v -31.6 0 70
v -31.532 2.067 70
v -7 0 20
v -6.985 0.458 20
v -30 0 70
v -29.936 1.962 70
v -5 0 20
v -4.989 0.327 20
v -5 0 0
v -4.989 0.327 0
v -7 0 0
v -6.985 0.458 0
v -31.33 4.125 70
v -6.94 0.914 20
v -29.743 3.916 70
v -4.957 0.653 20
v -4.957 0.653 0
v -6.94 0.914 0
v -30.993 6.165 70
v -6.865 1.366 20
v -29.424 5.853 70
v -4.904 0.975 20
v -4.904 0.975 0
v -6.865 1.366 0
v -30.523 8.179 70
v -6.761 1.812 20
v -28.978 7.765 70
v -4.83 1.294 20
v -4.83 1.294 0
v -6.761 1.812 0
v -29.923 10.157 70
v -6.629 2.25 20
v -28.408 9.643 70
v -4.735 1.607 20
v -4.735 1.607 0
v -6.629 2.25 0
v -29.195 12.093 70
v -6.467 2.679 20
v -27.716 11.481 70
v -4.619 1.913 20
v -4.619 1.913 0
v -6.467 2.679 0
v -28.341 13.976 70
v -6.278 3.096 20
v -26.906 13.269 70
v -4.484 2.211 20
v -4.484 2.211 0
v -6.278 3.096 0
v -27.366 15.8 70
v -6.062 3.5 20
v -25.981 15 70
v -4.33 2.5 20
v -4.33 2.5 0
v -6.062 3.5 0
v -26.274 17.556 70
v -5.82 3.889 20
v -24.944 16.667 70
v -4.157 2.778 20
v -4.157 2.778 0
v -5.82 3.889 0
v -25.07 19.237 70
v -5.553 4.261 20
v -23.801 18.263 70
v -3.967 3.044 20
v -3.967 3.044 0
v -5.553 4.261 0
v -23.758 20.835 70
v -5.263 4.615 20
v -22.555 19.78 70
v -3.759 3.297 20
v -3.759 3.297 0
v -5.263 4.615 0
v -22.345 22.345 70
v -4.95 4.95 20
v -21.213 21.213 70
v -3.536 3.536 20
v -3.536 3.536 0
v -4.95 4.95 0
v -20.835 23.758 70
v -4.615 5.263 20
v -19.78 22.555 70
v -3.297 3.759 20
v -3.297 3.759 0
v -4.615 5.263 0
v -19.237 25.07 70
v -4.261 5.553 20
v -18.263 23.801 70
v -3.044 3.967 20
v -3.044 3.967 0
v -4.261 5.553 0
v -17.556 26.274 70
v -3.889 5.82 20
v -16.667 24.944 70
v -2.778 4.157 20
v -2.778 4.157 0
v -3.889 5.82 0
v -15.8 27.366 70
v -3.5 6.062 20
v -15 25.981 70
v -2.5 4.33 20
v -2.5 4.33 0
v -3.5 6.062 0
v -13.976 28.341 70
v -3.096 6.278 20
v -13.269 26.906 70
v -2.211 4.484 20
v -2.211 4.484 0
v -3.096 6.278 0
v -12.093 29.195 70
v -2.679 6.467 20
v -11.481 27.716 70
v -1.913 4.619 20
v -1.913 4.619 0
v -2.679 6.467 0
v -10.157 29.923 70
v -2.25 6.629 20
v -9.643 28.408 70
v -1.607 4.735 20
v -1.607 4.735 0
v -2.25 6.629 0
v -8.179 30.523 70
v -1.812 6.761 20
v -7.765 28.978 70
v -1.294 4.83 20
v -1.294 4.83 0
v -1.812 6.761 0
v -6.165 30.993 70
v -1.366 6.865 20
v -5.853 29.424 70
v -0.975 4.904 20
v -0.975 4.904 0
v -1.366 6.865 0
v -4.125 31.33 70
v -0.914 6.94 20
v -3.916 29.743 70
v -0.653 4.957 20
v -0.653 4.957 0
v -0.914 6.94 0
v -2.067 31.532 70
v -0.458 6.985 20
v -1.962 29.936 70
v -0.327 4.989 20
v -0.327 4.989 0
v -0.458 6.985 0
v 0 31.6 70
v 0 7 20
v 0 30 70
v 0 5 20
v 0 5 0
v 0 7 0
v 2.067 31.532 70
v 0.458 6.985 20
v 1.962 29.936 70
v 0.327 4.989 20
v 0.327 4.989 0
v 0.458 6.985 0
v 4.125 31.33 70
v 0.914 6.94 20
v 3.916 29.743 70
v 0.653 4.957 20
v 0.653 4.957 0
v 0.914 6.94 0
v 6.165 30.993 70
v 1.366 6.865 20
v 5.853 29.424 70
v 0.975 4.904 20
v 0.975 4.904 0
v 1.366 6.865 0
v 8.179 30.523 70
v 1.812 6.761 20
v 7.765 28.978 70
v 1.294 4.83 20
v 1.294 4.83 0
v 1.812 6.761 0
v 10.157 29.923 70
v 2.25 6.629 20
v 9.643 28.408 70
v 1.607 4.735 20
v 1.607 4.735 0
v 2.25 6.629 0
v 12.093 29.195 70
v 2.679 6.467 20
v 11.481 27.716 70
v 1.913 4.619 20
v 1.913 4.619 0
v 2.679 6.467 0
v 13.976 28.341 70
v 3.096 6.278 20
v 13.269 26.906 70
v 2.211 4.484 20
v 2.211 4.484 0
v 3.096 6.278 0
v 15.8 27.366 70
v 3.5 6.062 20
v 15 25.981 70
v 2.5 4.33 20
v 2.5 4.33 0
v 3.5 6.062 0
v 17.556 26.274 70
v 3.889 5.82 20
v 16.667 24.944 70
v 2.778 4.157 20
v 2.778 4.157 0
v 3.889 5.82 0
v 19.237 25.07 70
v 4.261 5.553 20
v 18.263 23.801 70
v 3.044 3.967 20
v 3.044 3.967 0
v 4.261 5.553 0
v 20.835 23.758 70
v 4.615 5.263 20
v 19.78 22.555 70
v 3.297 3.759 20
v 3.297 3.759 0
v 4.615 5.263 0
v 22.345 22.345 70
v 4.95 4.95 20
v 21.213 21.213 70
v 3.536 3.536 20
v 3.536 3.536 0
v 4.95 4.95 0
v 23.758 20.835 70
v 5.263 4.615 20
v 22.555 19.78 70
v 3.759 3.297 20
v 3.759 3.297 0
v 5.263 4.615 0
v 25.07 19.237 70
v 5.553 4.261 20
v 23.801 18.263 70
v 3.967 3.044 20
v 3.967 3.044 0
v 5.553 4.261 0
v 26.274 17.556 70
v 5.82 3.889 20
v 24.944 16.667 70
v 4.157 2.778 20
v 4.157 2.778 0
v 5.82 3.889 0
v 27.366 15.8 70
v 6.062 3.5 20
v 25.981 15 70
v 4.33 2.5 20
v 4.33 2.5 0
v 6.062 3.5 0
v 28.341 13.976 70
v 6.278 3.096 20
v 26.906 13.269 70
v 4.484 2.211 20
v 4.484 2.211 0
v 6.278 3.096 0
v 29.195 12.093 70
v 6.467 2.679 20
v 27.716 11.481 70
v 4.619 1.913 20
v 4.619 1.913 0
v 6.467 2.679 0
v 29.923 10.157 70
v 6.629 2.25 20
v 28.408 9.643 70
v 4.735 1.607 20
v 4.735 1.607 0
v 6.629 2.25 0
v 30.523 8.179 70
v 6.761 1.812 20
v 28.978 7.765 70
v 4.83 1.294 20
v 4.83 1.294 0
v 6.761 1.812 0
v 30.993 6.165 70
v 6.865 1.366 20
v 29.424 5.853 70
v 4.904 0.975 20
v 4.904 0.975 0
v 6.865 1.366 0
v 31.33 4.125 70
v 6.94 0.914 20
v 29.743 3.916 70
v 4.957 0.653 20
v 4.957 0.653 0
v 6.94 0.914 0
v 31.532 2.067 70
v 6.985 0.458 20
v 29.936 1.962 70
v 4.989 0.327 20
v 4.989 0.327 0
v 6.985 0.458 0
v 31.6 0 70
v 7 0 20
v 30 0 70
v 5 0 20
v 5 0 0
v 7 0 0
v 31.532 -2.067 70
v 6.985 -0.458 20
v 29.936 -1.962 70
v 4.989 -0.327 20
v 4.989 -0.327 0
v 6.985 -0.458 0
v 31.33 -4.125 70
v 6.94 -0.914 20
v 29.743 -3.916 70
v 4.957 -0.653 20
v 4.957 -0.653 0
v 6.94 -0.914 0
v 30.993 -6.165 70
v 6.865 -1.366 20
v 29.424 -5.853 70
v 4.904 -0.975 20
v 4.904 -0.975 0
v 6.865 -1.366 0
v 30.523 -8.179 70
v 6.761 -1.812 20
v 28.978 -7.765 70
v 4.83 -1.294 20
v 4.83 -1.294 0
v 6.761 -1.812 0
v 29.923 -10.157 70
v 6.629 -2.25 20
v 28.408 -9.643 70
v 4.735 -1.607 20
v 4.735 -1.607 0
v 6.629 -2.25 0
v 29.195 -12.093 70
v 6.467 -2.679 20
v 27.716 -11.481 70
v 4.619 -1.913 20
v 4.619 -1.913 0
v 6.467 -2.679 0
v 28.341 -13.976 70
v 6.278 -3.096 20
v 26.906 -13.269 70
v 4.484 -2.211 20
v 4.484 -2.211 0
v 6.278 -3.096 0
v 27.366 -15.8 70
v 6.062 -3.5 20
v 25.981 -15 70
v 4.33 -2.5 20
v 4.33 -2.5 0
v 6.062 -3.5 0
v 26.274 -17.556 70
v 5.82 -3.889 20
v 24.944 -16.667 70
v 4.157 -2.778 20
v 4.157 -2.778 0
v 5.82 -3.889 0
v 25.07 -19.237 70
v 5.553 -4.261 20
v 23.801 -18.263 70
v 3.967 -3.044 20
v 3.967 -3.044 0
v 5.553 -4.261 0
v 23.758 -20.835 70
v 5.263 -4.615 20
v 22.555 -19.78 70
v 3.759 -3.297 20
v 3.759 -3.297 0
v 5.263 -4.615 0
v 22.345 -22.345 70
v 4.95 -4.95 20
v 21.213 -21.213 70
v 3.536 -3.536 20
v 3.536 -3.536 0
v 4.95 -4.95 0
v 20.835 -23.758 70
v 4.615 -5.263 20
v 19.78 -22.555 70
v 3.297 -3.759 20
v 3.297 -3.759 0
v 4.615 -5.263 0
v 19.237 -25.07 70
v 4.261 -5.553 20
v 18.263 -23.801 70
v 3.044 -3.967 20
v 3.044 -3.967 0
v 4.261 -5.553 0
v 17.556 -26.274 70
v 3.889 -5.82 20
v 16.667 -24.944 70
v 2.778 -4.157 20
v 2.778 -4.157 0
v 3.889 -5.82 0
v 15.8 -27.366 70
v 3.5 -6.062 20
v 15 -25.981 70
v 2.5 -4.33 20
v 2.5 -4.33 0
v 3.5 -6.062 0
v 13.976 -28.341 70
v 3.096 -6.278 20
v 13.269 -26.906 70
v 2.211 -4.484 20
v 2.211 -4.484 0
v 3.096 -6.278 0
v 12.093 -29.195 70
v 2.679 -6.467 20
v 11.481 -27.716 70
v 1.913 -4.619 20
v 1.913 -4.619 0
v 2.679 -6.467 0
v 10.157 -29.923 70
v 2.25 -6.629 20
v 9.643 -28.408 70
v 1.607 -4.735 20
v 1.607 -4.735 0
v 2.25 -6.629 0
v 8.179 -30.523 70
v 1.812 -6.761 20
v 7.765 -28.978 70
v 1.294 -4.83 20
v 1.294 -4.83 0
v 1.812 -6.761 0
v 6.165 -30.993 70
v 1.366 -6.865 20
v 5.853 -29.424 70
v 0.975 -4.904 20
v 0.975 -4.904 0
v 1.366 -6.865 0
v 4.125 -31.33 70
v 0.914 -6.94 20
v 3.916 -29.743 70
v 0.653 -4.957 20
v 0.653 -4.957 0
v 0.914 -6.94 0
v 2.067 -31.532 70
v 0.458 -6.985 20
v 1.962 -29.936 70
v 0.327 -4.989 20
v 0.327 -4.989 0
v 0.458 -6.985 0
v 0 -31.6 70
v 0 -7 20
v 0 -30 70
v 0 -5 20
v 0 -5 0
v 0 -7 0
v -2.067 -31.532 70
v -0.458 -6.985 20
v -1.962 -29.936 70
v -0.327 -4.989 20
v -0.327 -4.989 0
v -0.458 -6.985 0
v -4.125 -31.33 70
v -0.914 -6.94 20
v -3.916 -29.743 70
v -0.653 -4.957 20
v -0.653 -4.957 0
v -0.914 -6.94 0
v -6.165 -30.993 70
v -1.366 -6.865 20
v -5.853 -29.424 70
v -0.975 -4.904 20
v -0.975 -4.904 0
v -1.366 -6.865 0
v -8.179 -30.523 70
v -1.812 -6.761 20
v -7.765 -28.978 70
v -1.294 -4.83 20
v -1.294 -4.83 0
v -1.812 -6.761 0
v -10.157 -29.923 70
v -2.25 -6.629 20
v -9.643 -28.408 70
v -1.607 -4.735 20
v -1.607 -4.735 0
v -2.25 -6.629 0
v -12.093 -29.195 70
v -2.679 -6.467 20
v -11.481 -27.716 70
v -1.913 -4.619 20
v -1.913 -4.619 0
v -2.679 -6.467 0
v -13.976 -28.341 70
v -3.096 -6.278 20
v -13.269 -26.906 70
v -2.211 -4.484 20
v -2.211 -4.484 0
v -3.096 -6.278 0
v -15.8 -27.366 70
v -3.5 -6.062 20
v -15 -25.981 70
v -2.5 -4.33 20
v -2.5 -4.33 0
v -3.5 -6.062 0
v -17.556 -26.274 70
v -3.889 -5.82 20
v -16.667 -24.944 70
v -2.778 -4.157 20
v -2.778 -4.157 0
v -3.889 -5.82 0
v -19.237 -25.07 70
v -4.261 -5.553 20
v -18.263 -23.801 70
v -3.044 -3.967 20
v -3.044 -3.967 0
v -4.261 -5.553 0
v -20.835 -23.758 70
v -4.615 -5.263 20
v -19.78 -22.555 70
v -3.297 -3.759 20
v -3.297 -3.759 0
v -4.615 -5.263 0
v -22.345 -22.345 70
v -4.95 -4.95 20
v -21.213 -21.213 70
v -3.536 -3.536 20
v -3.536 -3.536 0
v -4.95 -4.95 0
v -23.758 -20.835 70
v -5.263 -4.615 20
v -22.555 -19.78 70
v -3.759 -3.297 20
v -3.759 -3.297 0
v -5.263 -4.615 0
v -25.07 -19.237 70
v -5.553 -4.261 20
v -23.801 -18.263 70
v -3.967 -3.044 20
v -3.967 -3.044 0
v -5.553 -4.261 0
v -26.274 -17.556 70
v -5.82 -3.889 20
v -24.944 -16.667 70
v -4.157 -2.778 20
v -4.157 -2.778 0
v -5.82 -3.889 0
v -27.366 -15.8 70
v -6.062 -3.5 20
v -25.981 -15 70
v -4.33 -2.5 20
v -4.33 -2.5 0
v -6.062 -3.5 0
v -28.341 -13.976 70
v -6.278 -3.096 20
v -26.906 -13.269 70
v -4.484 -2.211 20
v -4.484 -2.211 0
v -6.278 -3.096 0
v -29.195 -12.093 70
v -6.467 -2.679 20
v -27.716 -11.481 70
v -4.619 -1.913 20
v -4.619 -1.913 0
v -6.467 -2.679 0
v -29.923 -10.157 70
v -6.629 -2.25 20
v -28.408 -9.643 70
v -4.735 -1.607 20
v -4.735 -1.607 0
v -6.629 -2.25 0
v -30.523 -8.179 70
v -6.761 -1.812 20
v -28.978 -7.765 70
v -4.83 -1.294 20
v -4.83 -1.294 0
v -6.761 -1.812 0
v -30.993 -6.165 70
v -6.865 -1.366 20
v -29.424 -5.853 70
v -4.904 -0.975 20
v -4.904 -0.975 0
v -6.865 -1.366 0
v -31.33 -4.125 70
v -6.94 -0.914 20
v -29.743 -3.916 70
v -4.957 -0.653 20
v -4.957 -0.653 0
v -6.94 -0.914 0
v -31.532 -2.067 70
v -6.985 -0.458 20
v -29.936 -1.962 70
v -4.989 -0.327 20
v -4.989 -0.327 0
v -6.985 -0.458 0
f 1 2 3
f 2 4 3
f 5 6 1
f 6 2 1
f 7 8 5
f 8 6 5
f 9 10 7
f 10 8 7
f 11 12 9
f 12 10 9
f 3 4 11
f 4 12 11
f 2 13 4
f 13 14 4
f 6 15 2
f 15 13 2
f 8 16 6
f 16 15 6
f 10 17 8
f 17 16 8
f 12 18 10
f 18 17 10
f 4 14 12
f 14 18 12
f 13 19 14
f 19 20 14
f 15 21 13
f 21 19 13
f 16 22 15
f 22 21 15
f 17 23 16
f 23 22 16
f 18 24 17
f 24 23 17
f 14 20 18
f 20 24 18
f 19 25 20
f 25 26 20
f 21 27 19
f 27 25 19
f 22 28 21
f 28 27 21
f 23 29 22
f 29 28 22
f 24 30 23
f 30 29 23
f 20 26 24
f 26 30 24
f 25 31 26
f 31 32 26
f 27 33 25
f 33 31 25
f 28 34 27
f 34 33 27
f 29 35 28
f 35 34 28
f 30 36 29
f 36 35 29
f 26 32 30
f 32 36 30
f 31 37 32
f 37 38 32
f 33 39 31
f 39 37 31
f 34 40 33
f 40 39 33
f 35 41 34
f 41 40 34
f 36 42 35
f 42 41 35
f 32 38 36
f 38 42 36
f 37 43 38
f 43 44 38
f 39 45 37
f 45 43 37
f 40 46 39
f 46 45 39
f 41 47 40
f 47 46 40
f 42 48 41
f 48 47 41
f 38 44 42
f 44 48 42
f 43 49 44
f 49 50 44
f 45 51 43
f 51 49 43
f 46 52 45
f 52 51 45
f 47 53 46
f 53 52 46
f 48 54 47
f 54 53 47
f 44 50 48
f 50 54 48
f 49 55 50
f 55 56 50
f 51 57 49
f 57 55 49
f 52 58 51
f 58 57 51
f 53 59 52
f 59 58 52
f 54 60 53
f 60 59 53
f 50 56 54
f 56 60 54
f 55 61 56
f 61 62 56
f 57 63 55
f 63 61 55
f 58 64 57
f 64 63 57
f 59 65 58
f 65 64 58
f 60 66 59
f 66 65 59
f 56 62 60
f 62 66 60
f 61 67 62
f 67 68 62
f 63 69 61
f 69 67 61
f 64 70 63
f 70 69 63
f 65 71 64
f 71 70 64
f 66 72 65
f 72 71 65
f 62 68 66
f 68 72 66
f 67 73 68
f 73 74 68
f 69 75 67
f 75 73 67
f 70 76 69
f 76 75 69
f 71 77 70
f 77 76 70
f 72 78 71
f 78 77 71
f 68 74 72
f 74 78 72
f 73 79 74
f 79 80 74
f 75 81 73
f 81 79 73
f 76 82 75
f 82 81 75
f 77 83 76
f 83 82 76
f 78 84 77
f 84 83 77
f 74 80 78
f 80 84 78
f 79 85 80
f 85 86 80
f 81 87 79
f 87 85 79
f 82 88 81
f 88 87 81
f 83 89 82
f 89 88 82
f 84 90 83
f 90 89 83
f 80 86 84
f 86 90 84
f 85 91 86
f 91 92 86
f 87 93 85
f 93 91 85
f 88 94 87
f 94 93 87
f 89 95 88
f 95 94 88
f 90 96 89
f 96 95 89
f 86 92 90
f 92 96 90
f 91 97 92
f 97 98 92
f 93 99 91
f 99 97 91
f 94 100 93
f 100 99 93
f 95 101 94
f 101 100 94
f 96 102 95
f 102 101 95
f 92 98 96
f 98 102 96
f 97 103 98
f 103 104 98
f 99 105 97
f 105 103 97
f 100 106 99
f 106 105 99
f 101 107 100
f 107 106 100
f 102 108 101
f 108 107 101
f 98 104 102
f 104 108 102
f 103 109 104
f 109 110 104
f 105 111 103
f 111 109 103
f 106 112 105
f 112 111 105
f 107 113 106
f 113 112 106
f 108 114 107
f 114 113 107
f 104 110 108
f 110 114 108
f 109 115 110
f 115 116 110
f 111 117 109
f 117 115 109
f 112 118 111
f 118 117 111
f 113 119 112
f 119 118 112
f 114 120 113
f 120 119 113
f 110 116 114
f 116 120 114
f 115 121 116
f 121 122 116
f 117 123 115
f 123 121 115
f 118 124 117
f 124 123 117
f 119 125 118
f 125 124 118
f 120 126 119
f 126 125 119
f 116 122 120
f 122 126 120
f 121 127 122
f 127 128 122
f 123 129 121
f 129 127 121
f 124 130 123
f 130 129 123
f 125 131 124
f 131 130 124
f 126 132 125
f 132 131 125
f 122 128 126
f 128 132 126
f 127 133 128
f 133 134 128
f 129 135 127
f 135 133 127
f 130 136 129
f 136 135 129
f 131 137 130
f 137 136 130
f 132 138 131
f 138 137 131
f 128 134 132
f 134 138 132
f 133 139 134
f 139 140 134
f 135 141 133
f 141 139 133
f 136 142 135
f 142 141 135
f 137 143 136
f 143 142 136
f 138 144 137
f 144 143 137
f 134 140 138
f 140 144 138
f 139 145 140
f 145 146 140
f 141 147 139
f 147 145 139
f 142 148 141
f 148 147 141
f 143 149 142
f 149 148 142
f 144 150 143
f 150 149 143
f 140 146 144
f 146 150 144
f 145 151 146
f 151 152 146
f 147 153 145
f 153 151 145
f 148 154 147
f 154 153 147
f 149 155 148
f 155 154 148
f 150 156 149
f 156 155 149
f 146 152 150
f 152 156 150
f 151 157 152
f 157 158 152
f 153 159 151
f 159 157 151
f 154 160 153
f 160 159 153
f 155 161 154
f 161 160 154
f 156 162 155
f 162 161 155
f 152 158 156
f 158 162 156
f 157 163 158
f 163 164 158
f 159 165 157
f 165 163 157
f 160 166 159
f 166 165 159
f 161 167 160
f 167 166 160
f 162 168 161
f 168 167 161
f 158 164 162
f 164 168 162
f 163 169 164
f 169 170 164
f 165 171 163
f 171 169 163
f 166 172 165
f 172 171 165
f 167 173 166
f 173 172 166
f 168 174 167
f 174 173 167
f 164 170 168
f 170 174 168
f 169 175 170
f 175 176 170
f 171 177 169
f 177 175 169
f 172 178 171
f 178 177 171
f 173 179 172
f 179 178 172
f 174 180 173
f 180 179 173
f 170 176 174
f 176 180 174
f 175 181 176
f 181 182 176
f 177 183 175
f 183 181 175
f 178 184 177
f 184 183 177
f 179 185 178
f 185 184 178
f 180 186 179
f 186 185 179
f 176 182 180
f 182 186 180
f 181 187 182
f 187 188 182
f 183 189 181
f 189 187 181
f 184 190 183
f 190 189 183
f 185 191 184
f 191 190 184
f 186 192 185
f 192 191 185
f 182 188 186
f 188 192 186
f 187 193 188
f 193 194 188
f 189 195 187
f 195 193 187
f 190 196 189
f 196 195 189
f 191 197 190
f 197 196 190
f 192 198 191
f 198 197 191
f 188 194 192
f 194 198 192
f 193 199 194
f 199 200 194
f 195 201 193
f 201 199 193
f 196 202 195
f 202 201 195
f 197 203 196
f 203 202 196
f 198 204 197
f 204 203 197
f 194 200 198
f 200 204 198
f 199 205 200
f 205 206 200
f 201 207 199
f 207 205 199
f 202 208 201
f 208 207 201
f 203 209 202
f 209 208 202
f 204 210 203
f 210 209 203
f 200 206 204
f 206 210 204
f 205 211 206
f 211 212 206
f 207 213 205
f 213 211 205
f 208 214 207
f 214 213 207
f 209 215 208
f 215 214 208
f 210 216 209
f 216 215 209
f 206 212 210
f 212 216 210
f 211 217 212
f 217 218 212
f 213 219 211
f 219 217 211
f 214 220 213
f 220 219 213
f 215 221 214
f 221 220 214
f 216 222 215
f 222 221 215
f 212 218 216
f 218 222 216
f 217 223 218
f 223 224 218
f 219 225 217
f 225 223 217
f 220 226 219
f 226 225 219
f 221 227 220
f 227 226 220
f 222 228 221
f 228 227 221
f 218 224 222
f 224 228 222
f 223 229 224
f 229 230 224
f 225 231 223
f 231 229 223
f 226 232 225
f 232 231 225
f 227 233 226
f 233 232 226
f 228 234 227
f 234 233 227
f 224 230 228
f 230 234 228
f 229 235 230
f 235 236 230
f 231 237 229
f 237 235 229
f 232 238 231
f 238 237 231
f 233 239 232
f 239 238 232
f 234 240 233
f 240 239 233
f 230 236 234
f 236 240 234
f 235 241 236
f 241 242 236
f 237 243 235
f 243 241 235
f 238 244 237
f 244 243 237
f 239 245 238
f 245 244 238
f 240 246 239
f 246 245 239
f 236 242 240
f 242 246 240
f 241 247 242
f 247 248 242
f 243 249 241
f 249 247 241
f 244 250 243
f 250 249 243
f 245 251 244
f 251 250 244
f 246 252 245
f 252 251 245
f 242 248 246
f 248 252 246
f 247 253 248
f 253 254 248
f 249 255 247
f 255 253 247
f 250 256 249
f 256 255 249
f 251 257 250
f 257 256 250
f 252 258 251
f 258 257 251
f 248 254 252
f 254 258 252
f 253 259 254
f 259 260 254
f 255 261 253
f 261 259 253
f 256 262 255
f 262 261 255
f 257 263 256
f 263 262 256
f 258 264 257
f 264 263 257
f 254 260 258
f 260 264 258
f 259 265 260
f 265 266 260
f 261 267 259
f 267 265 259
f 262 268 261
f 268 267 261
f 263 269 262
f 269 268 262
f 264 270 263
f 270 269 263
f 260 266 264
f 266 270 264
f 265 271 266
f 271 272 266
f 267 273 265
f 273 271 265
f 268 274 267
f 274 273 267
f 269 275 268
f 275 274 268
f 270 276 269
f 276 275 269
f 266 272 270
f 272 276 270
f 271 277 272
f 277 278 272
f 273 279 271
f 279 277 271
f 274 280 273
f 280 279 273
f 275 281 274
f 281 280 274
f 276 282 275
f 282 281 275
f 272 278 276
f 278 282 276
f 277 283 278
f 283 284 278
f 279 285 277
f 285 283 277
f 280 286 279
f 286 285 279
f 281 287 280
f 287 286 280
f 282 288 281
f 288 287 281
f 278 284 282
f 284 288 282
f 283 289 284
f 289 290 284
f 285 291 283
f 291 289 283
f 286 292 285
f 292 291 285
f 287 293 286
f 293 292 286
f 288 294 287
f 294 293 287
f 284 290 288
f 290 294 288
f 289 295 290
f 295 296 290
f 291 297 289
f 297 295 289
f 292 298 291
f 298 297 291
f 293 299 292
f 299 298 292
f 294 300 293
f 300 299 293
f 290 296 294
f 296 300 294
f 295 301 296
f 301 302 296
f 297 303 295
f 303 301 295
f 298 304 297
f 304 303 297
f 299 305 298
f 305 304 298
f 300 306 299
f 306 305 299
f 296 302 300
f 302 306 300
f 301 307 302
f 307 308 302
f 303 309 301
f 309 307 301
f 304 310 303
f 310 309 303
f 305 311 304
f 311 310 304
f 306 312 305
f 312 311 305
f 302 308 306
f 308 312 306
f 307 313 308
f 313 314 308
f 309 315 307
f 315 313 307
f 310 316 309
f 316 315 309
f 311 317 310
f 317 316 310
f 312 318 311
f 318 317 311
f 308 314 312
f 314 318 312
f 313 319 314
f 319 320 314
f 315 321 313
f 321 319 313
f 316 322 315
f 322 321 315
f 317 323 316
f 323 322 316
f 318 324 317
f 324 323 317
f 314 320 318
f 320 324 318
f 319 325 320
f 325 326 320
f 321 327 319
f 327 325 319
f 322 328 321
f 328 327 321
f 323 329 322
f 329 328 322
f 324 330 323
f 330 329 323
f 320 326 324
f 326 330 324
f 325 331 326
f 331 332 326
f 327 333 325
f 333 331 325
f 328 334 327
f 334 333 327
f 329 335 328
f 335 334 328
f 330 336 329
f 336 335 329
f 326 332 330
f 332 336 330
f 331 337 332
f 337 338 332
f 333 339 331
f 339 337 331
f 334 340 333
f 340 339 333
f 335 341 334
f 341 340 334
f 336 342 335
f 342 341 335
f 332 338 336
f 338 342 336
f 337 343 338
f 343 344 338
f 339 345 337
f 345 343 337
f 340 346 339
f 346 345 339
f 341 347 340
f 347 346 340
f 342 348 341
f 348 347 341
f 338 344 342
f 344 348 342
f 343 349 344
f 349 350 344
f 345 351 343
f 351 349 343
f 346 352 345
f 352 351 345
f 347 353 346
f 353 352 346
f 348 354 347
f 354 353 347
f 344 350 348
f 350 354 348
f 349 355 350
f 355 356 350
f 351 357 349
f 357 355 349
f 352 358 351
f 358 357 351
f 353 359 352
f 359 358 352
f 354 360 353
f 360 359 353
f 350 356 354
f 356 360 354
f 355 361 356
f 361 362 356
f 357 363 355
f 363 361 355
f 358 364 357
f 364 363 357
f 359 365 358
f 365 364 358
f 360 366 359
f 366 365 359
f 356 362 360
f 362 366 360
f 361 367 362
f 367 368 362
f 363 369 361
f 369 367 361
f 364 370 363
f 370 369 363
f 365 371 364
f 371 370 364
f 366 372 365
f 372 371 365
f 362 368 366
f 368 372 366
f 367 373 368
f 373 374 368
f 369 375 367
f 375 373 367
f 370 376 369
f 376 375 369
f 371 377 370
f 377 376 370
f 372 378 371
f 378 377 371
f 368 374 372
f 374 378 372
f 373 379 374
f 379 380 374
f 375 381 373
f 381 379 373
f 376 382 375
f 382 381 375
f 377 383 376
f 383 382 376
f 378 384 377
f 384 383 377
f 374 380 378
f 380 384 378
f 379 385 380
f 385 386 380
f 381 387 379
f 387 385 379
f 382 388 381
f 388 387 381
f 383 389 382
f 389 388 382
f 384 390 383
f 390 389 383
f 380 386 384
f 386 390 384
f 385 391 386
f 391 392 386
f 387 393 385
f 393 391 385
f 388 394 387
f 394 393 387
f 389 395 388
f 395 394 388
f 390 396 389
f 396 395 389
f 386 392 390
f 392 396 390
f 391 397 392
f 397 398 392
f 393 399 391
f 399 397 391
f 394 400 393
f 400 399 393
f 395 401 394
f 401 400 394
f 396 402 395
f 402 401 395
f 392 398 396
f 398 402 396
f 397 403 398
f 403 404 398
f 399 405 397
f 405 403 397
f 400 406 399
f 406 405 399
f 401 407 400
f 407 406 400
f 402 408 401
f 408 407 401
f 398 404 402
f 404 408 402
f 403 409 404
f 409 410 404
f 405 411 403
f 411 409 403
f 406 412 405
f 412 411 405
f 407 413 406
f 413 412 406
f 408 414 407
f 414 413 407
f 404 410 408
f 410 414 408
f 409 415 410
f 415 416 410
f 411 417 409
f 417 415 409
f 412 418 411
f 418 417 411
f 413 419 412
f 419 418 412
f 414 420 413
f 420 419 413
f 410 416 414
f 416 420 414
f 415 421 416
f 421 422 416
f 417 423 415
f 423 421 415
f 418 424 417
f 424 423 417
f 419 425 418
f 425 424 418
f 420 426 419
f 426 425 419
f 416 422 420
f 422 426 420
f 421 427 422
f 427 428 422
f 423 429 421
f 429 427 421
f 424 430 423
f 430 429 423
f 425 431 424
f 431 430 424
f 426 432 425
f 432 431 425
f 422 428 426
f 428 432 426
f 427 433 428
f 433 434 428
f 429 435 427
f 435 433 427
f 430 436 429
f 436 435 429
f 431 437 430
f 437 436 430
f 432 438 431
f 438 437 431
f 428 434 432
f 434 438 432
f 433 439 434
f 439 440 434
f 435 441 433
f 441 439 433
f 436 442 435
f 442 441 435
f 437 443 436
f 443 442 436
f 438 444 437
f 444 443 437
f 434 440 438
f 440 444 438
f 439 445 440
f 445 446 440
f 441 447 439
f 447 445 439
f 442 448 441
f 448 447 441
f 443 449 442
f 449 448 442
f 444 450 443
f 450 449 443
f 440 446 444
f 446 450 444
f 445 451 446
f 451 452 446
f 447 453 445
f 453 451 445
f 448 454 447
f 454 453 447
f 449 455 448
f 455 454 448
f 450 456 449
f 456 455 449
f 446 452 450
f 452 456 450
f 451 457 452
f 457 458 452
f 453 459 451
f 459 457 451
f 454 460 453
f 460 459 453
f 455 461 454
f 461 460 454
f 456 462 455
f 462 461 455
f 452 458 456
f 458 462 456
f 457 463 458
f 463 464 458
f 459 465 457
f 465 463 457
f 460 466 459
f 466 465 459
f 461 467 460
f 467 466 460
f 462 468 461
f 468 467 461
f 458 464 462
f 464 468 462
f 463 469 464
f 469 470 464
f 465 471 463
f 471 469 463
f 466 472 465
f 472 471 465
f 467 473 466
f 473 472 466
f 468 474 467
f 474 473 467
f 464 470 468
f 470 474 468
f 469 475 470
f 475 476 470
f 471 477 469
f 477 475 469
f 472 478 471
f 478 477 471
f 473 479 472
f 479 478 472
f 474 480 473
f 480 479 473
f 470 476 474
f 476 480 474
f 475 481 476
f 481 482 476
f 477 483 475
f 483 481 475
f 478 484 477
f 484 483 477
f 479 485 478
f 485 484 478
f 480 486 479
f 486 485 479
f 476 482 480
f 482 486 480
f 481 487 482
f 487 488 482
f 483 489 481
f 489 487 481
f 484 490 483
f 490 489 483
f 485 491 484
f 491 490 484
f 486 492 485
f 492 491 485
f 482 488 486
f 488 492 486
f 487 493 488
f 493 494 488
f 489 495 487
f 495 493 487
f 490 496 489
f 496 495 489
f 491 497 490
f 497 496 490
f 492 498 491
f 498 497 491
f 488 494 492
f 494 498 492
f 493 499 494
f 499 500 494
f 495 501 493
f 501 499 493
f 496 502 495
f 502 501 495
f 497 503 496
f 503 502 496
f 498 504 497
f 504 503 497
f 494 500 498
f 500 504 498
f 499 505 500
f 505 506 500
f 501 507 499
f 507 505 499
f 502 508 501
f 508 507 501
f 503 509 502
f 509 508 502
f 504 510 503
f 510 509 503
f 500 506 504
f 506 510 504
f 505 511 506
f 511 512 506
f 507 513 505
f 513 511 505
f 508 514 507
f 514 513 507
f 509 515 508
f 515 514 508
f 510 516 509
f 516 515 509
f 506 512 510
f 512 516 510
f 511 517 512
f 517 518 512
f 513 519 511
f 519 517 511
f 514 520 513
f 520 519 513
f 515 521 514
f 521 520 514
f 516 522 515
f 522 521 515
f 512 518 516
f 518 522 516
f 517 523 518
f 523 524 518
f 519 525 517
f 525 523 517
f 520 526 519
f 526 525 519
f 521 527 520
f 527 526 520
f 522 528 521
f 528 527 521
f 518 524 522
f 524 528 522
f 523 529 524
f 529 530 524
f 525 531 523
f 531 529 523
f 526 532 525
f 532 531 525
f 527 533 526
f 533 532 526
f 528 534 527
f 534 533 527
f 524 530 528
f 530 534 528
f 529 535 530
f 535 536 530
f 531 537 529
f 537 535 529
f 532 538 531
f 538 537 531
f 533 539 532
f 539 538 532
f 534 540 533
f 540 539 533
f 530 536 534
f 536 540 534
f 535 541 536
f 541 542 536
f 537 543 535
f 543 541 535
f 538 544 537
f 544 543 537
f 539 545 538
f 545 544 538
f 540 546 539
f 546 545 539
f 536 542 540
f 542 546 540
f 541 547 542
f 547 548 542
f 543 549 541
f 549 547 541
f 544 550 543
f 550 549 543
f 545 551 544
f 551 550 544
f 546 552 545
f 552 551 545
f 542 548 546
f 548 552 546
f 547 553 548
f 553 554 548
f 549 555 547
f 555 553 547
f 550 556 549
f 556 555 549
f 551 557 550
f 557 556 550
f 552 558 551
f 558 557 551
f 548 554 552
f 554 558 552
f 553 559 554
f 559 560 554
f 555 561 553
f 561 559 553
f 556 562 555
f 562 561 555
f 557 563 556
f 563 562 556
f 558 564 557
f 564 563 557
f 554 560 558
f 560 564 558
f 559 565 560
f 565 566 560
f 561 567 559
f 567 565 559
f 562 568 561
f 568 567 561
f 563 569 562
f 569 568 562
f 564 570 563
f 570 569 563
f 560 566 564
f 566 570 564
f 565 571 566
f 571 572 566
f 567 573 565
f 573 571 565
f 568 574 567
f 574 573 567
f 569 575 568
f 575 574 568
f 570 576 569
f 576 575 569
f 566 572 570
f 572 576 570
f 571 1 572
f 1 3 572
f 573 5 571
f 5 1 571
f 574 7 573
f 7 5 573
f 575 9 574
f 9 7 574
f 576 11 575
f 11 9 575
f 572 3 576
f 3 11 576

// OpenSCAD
// t2-007 funnel
$fn = 96;
inlet_diameter = 60;
outlet_diameter = 10;
wall_thickness = 1.6;
spout_od = 14;
spout_length = 20;
cone_height = 50;
cone_top_od = 63.2;

rotate_extrude()
    polygon([
        [outlet_diameter / 2, 0],
        [spout_od / 2, 0],
        [spout_od / 2, spout_length],
        [cone_top_od / 2, spout_length + cone_height],
        [inlet_diameter / 2, spout_length + cone_height],
        [outlet_diameter / 2, spout_length]
    ]);
